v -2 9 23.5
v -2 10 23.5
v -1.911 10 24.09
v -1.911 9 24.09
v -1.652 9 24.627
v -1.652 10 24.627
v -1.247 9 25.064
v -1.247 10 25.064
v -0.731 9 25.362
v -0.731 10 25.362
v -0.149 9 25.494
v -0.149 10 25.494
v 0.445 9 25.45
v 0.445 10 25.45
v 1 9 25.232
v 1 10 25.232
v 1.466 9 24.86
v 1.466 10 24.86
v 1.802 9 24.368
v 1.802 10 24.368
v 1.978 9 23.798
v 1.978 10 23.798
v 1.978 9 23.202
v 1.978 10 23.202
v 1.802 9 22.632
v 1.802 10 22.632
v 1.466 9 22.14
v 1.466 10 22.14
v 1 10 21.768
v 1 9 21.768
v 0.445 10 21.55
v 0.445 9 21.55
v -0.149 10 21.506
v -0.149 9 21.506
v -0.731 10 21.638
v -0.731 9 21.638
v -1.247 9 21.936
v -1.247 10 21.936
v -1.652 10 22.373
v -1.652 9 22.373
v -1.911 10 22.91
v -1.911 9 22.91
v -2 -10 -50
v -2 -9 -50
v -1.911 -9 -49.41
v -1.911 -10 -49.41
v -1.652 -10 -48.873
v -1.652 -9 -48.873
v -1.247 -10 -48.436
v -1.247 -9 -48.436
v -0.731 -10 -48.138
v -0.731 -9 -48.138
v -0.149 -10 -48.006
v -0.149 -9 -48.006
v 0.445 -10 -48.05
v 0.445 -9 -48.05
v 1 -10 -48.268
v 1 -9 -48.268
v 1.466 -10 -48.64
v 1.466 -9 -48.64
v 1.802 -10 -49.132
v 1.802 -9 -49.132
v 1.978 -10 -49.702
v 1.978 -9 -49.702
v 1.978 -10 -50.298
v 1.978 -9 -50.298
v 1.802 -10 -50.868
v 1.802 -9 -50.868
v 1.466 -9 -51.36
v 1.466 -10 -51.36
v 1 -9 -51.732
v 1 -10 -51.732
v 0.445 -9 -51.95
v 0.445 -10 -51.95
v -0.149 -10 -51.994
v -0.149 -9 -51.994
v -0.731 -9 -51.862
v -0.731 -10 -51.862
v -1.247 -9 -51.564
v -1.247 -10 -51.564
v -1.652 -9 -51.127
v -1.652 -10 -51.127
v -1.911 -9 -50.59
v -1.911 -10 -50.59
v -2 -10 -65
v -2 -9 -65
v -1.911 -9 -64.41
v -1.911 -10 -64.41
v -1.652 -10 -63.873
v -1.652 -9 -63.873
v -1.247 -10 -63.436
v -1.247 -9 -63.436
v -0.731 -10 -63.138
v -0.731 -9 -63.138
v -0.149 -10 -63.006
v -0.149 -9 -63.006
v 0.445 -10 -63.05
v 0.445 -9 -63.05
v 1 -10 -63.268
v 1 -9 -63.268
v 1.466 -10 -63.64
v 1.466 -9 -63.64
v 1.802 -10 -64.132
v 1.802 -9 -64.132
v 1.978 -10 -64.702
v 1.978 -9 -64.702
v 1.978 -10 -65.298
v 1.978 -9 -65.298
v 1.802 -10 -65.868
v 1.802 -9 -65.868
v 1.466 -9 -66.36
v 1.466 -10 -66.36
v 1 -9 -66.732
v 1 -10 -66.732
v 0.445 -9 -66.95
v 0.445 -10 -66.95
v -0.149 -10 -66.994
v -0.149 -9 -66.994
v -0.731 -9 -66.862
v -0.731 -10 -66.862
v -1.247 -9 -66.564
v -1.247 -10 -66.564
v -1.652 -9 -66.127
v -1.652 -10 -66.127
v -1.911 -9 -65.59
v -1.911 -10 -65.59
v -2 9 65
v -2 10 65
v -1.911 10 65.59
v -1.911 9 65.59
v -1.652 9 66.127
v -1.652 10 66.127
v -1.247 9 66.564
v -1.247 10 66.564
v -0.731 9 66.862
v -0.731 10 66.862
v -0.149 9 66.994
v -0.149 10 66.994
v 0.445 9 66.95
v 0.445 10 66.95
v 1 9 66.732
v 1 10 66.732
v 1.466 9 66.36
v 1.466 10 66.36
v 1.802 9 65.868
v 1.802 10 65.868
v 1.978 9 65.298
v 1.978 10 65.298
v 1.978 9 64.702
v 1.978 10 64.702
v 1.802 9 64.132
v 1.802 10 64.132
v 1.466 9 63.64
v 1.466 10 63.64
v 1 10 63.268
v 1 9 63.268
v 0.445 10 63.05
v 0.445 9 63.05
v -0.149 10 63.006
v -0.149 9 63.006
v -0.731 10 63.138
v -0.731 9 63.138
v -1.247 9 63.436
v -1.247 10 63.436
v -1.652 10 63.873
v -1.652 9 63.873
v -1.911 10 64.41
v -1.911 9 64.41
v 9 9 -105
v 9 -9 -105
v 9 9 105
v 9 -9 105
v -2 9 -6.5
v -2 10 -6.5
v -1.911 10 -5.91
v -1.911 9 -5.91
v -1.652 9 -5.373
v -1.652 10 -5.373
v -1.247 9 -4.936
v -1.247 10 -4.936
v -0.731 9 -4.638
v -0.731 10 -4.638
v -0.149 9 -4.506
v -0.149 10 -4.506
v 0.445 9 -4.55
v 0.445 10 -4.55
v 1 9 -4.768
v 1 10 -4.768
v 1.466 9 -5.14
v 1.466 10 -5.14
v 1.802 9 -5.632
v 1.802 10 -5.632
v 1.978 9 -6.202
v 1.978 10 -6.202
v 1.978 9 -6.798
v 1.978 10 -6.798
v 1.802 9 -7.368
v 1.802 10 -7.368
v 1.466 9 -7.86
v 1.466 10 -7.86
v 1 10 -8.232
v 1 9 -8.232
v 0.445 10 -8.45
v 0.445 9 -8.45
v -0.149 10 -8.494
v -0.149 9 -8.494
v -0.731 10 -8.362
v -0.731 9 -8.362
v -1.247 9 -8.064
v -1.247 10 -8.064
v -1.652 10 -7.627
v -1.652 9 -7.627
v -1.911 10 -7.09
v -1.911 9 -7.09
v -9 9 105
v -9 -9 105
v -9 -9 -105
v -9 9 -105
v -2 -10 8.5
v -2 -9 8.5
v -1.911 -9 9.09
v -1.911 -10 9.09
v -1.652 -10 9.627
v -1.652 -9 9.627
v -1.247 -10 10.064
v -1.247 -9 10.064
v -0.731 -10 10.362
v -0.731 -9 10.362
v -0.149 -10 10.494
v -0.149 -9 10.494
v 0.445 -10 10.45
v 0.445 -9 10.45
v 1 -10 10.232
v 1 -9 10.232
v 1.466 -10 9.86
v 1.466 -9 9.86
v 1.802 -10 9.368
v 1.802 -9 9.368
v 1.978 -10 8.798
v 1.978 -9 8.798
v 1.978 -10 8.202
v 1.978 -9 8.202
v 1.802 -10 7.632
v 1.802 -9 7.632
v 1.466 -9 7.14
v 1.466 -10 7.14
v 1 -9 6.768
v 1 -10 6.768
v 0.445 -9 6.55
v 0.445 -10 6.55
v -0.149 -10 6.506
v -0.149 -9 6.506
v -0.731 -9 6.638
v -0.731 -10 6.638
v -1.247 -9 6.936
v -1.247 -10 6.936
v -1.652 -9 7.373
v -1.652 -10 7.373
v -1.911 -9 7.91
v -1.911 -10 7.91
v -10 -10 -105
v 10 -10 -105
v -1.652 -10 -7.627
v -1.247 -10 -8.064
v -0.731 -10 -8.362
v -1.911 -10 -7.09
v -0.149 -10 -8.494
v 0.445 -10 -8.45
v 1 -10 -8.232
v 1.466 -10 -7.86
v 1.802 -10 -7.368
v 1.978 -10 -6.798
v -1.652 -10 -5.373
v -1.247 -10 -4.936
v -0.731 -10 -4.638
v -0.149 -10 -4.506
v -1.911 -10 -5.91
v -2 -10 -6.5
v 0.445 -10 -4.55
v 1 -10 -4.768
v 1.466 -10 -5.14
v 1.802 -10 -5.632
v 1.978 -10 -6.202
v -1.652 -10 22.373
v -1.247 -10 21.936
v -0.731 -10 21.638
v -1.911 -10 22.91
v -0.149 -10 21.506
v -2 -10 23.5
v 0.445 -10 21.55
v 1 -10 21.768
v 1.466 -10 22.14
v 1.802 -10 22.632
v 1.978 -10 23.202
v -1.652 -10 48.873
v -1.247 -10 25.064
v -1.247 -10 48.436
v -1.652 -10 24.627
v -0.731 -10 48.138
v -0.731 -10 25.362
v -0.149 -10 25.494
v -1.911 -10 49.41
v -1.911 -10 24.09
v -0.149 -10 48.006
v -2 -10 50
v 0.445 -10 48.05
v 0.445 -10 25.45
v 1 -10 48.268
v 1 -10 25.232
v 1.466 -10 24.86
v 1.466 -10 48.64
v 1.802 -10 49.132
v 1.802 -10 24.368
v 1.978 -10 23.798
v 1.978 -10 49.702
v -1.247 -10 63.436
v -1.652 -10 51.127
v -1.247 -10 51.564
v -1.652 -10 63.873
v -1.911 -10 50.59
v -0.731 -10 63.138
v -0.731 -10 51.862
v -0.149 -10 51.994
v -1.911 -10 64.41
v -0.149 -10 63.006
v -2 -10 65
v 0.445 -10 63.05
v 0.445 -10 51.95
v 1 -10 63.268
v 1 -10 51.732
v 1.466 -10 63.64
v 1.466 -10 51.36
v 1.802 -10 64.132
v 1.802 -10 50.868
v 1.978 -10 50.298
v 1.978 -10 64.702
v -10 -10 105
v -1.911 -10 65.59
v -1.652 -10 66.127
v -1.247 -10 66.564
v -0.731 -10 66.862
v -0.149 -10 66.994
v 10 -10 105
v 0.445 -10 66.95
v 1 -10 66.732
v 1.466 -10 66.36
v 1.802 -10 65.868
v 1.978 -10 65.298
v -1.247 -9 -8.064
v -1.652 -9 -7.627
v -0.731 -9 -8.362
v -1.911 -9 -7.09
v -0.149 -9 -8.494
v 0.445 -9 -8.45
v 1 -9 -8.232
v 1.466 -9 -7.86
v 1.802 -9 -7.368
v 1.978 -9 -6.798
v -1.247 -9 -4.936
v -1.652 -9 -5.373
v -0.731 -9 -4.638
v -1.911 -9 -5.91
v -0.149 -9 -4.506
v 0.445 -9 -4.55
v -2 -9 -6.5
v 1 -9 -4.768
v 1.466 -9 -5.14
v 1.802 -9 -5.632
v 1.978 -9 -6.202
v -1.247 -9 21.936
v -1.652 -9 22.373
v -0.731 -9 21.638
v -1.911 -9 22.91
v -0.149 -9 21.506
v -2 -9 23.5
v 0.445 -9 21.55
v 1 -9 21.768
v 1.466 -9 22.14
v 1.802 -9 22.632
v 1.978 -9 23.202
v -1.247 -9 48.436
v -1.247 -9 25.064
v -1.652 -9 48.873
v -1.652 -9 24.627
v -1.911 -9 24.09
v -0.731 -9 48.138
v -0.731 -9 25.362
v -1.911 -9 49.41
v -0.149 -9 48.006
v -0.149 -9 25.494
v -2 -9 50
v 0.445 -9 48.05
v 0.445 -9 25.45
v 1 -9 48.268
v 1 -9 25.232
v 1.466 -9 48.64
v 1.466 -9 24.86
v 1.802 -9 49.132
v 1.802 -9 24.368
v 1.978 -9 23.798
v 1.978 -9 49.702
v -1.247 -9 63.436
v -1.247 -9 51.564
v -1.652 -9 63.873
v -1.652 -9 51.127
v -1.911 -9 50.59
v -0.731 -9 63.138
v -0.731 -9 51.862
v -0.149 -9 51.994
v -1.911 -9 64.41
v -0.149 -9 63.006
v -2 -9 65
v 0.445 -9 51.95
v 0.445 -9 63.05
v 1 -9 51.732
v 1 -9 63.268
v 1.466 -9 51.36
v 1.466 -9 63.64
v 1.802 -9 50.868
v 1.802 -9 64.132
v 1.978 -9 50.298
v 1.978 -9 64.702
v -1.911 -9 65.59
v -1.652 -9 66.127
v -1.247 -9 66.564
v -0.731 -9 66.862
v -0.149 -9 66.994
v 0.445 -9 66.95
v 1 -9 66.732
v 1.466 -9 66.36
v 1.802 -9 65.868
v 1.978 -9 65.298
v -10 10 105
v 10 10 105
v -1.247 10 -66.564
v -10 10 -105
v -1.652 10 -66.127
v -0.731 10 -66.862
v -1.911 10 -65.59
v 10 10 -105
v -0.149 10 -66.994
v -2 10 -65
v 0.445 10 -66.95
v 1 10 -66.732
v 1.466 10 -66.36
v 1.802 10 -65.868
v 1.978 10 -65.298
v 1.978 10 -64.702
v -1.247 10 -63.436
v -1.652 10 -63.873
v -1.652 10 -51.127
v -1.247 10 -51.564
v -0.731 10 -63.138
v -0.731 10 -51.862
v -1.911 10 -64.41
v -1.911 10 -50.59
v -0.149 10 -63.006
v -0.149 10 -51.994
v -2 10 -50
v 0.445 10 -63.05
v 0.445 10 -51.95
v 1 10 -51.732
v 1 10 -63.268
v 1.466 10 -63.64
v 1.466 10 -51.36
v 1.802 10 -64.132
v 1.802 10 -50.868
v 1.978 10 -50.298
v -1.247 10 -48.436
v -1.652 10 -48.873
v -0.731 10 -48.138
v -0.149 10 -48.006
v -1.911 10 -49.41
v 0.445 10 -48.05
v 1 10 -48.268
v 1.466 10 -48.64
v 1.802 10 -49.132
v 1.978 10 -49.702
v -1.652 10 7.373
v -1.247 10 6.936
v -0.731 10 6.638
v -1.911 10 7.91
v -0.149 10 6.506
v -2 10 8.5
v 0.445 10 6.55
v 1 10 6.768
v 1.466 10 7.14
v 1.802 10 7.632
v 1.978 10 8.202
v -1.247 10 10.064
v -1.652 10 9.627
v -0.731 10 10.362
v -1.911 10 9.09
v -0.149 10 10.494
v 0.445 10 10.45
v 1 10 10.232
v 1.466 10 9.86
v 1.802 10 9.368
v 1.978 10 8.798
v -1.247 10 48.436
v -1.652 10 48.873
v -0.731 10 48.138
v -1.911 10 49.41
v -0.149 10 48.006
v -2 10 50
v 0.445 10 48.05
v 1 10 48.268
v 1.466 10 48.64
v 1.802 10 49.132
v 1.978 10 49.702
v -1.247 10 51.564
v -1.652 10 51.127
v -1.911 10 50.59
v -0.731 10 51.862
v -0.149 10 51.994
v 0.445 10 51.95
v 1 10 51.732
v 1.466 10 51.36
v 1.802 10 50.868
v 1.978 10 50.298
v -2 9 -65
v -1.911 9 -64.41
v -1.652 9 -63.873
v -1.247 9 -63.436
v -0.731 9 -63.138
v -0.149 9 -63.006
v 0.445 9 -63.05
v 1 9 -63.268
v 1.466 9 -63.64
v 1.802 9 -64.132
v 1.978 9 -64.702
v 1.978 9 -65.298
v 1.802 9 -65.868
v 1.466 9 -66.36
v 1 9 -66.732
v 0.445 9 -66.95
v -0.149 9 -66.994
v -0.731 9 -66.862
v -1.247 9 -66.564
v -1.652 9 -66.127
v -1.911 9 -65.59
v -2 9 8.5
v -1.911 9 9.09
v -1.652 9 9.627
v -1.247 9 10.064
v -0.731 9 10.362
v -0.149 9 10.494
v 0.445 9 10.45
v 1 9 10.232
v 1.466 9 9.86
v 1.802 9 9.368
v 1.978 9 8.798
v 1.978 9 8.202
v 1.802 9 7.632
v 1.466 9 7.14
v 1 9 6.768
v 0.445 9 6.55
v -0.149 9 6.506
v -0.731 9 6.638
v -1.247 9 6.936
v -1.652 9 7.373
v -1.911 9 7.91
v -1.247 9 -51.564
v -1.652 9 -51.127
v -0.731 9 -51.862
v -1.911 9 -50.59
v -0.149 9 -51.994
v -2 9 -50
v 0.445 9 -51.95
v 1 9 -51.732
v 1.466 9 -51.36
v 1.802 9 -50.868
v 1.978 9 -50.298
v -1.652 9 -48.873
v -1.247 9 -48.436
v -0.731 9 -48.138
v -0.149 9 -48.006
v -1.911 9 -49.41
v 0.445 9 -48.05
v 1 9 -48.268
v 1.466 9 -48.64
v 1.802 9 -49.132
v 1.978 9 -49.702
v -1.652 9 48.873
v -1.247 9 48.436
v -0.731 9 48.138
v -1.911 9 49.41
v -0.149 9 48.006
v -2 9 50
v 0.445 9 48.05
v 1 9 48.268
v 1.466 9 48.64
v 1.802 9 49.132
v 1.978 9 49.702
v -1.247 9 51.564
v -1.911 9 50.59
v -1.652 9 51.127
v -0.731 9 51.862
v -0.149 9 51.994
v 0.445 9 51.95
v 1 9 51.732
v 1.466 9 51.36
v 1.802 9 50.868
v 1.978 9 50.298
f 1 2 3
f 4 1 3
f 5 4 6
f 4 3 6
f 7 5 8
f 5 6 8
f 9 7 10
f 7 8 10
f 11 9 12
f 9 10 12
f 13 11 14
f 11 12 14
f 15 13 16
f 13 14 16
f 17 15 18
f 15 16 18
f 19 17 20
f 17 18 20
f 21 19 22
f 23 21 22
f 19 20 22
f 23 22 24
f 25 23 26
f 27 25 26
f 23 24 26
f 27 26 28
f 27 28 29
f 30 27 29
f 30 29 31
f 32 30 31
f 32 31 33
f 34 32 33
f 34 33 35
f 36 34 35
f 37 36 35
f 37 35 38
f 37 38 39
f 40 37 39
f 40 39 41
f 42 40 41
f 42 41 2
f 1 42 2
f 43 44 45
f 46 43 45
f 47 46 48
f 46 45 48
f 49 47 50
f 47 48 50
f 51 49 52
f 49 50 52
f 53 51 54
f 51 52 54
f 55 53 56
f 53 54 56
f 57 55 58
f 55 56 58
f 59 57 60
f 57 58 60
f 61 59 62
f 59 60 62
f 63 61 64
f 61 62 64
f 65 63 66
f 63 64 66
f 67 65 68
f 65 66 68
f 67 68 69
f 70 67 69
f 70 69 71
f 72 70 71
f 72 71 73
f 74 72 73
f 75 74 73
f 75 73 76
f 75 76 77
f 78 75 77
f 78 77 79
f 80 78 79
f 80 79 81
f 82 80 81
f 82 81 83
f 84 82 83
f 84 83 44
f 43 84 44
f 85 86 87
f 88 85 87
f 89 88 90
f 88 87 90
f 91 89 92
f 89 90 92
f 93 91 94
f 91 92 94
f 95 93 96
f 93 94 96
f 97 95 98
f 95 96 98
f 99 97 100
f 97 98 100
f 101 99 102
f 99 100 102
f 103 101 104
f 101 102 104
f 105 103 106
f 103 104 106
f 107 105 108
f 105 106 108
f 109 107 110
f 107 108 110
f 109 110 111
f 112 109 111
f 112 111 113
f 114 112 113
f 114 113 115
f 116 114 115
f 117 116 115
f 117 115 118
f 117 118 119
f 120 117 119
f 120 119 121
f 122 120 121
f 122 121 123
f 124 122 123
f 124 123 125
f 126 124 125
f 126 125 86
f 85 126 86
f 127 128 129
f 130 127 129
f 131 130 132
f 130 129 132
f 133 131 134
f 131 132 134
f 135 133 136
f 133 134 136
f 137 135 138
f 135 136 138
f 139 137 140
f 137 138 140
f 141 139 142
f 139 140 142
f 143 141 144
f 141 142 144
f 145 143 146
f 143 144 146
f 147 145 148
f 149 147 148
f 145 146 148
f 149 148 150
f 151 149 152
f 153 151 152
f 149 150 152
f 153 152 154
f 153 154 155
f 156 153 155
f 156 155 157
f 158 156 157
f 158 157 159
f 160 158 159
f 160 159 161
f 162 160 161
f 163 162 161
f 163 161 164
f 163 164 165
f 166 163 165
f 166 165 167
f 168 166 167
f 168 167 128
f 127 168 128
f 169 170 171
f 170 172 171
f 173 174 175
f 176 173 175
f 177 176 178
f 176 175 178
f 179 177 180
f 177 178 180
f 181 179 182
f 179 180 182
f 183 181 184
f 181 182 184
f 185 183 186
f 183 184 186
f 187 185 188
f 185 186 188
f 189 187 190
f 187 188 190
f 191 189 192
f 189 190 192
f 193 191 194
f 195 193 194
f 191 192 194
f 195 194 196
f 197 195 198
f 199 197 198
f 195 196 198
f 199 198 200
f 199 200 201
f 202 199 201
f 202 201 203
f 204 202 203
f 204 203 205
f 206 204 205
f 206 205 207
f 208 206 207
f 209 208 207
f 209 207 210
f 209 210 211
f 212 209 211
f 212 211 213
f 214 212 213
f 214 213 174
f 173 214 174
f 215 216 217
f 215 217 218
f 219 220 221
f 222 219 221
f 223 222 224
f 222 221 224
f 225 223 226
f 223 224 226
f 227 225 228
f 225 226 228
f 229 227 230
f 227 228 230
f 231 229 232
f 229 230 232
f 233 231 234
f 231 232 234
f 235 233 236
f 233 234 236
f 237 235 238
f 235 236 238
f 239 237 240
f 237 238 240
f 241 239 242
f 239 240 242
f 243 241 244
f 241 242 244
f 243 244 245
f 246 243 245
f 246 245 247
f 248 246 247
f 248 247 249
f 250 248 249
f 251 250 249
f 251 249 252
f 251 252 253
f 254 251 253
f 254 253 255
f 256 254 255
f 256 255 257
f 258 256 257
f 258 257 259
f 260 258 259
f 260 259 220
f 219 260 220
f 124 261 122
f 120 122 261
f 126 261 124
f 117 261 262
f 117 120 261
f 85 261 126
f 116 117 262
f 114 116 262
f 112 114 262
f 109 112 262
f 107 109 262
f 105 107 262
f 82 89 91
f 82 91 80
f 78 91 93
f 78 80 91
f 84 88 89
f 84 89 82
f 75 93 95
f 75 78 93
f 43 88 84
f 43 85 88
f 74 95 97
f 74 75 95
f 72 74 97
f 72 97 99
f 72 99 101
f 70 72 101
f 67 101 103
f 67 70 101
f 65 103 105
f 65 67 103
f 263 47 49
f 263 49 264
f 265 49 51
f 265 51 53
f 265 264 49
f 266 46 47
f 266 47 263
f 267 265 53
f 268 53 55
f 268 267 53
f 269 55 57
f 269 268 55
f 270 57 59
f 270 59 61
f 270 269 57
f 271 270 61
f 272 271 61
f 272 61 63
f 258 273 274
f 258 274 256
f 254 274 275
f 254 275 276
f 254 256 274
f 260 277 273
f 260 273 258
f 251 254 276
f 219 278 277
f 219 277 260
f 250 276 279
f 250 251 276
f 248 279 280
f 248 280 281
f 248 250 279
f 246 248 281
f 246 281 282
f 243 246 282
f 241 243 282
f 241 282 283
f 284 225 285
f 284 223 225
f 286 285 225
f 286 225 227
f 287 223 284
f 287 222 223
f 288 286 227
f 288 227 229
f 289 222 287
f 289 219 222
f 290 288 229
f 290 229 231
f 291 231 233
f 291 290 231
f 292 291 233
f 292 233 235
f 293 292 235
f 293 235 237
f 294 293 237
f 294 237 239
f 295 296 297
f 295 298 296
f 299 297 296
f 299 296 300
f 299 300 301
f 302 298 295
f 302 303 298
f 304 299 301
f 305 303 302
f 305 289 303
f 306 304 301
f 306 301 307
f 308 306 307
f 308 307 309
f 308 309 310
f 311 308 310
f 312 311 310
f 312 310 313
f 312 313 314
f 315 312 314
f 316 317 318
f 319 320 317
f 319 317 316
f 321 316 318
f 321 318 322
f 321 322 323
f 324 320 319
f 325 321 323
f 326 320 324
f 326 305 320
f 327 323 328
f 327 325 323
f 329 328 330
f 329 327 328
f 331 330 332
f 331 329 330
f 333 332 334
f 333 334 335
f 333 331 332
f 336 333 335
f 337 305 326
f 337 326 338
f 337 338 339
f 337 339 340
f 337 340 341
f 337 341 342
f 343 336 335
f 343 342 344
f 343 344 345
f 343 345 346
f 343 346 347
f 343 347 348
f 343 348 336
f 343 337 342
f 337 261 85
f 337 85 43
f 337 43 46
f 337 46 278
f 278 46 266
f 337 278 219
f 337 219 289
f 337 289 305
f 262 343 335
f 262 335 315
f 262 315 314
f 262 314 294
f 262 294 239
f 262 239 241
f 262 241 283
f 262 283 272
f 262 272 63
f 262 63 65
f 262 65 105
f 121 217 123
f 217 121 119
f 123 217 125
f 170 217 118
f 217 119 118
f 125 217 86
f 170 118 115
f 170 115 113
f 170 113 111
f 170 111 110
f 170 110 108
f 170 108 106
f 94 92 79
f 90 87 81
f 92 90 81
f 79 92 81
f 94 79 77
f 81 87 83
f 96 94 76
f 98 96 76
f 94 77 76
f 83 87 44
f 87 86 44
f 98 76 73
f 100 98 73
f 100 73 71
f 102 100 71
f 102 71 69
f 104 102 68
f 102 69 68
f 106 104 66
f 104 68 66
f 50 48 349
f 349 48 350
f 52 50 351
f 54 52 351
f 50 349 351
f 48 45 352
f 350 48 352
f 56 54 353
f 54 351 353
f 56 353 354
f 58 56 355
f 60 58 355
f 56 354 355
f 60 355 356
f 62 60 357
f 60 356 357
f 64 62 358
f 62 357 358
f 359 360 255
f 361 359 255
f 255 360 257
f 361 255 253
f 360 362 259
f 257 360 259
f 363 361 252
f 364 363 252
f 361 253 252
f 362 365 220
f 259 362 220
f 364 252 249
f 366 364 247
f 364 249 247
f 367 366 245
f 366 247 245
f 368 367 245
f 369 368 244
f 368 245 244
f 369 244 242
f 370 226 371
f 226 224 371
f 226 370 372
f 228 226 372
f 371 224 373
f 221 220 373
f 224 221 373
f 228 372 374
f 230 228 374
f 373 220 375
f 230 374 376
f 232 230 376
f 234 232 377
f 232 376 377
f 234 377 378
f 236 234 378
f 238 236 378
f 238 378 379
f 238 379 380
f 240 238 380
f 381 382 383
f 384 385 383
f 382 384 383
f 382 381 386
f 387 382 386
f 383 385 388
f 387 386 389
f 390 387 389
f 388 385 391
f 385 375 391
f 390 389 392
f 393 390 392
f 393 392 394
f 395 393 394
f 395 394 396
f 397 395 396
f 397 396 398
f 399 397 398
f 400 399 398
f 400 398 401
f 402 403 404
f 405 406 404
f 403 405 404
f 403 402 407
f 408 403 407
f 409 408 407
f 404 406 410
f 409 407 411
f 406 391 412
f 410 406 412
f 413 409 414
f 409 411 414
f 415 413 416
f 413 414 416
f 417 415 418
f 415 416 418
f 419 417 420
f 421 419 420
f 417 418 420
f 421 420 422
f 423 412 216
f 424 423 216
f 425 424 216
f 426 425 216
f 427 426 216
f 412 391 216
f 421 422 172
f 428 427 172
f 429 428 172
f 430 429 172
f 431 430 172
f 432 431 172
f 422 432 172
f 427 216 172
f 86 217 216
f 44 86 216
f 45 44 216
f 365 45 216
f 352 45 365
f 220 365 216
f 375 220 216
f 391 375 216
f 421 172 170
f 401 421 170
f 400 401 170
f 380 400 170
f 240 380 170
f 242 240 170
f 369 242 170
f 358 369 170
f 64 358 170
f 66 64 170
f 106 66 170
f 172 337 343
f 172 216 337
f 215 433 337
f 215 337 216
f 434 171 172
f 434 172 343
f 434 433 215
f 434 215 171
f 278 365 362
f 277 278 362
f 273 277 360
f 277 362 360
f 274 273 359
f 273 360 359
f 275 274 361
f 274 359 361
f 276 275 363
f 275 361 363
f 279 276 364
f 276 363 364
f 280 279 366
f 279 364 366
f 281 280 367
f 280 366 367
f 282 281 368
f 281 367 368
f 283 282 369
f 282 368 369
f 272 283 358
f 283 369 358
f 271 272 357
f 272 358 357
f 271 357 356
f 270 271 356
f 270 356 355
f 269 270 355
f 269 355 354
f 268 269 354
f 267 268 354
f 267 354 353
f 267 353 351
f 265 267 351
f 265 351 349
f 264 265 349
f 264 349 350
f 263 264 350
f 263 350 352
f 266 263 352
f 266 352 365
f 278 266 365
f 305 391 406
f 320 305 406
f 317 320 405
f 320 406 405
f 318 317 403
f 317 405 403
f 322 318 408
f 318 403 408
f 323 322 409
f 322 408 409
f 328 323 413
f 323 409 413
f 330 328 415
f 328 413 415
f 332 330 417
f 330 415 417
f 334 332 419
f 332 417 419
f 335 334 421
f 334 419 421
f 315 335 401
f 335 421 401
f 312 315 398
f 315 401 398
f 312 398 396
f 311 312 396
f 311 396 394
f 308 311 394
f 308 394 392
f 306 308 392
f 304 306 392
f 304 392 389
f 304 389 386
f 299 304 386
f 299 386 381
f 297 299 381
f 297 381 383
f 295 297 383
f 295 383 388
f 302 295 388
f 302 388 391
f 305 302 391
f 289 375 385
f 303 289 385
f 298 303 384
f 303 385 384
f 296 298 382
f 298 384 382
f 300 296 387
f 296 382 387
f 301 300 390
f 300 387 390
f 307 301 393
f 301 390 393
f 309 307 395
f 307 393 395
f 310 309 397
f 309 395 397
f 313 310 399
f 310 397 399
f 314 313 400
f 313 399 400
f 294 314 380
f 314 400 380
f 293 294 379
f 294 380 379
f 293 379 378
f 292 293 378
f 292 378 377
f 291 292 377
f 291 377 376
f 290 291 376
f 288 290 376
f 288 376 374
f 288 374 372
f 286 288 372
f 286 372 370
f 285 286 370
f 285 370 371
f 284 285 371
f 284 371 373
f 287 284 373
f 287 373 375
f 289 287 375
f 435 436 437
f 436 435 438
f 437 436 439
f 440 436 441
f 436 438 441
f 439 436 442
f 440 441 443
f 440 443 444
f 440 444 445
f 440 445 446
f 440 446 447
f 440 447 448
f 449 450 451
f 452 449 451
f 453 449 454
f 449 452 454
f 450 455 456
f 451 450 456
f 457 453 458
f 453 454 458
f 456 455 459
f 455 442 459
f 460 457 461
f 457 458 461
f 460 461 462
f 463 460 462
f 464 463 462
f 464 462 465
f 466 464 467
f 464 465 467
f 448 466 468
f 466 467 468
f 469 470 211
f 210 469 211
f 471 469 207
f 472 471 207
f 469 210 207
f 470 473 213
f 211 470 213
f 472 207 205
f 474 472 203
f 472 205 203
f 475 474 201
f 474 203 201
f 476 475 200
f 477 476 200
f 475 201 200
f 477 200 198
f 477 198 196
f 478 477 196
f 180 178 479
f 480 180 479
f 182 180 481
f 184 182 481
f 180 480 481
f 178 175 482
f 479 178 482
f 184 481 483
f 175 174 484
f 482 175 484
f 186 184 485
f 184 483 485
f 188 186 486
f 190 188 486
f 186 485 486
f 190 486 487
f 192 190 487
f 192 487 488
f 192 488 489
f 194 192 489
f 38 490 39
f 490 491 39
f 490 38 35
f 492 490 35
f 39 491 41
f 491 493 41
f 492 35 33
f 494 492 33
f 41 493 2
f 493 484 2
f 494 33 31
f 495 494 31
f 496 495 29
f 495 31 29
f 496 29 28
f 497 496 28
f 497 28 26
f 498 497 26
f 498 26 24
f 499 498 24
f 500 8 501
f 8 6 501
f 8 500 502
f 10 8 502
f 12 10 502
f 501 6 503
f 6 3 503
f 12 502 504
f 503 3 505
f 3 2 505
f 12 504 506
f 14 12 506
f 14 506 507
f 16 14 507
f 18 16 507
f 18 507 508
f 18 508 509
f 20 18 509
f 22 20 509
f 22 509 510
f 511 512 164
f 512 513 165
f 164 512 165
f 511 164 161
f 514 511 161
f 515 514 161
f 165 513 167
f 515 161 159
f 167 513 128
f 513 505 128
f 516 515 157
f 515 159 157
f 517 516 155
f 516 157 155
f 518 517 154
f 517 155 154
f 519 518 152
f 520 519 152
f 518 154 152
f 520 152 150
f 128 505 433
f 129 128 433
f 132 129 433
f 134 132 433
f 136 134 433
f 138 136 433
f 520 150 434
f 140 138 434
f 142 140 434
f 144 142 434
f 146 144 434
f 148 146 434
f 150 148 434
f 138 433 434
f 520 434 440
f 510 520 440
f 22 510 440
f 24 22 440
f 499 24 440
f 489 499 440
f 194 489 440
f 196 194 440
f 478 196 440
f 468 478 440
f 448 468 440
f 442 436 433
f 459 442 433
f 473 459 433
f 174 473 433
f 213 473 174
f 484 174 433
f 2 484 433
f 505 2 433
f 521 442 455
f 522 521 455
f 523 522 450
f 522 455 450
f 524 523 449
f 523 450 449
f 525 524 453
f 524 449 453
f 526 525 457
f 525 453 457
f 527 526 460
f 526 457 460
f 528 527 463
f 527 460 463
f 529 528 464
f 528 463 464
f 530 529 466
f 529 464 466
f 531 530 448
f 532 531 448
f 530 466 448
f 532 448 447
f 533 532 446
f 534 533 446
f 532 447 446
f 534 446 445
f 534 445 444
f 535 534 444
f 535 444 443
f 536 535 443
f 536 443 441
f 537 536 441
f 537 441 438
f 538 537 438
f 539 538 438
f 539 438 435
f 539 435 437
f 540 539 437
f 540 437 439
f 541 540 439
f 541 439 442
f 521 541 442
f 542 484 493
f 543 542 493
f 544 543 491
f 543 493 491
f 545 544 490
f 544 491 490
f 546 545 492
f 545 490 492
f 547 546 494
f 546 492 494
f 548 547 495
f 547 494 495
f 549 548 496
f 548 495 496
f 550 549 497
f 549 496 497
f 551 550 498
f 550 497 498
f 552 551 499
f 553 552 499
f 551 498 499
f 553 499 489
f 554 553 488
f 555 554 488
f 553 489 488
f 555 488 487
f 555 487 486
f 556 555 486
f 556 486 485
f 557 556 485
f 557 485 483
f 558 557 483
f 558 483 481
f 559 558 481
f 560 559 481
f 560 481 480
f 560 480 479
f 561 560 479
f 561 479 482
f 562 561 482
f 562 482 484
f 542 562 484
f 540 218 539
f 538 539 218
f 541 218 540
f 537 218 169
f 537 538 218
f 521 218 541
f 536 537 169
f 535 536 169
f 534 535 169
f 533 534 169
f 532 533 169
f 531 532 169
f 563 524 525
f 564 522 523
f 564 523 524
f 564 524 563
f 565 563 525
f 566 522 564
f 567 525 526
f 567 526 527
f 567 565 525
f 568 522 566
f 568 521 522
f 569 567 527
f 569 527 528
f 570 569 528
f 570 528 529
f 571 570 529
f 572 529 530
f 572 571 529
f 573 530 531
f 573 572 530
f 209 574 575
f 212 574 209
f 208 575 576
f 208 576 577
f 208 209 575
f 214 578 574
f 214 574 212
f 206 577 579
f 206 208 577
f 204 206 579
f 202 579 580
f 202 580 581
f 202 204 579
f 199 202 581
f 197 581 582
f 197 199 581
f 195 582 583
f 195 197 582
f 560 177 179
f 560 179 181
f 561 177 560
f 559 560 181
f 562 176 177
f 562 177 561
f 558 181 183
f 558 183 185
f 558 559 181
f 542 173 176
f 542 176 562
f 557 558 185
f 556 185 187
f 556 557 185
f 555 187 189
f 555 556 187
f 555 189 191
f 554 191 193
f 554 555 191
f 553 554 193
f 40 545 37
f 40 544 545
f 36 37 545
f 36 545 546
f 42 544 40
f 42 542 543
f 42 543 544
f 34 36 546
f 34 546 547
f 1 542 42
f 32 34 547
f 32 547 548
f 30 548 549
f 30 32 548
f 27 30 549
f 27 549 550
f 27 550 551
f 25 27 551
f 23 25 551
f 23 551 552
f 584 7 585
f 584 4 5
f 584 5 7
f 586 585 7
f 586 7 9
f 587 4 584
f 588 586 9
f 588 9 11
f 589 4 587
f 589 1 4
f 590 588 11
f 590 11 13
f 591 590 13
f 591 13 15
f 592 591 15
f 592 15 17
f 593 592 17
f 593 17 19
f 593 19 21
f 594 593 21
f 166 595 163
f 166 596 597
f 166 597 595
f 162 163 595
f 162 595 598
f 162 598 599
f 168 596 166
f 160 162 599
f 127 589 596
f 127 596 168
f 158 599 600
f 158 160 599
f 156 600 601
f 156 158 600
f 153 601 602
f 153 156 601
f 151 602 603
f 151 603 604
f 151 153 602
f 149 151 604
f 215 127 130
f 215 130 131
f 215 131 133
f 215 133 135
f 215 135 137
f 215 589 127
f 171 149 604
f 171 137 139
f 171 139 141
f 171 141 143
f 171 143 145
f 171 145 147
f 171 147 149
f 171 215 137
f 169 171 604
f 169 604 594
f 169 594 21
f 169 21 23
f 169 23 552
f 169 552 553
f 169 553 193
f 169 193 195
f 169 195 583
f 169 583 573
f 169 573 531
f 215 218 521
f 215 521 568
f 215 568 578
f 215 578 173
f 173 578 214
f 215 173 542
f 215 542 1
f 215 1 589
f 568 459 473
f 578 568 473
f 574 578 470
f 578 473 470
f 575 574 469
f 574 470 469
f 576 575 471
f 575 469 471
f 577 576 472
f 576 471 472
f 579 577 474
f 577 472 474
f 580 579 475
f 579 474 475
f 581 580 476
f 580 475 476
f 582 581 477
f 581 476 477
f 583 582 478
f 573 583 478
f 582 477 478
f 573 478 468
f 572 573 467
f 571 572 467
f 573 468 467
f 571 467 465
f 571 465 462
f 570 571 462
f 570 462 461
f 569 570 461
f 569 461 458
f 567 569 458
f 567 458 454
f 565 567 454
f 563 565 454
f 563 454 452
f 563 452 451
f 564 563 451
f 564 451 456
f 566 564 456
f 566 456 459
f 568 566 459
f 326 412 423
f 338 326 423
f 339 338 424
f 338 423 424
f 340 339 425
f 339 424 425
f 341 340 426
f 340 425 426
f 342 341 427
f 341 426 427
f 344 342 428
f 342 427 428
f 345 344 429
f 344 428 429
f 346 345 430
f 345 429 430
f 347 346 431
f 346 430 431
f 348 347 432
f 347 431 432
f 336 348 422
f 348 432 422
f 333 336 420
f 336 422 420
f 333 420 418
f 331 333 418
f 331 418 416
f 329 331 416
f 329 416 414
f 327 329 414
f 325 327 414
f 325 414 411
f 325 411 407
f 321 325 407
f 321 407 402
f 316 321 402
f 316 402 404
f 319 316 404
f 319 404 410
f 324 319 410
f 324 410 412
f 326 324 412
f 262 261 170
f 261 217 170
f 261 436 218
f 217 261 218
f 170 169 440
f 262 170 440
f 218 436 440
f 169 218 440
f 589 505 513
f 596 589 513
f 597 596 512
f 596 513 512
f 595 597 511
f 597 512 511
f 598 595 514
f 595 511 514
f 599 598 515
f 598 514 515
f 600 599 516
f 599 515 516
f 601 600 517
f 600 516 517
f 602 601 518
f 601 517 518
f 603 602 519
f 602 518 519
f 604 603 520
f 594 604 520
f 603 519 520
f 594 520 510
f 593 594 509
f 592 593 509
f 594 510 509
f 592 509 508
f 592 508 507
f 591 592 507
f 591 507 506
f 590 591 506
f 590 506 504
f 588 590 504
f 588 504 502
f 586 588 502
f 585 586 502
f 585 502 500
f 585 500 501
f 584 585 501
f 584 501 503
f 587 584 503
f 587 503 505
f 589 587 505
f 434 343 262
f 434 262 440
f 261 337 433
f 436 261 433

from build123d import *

# Parameters (mm, degrees)
SKETCH_1_W          = 20
SKETCH_1_H          = 20
SKETCH_1_W_2        = 18
SKETCH_1_H_2        = 18
EXTRUDE_1_DEPTH     = 105
SKETCH_2_R          = 2
CUT_EXTRUDE_1_DEPTH = 108.354552768
SKETCH_3_R          = 2
CUT_EXTRUDE_2_DEPTH = 108.354552768


with BuildPart() as part:
    # 草图1 → 凸台-拉伸1 (new, symmetric)
    with BuildSketch(Plane.XY):
        Rectangle(SKETCH_1_W, SKETCH_1_H)
        Rectangle(SKETCH_1_W_2, SKETCH_1_H_2, mode=Mode.SUBTRACT)
    extrude(amount=EXTRUDE_1_DEPTH, both=True)

    # 草图2 → 切除-拉伸1 (cut, through all)
    with BuildSketch(Plane(origin=(0, 10, 0), x_dir=(1, 0, 0), z_dir=(0, 1, 0))):
        with Locations(Location((0, 65, 0), (0, 0, 180))):
            Circle(SKETCH_2_R)
        with Locations(Location((0, -65, 0), (0, 0, 180))):
            Circle(SKETCH_2_R)
        with Locations(Location((0, -50, 0), (0, 0, 180))):
            Circle(SKETCH_2_R)
        with Locations(Location((0, 50, 0), (0, 0, 180))):
            Circle(SKETCH_2_R)
    extrude(amount=-CUT_EXTRUDE_1_DEPTH, mode=Mode.SUBTRACT)

    # 草图3 → 切除-拉伸2 (cut, through all)
    with BuildSketch(Plane(origin=(0, 10, 0), x_dir=(1, 0, 0), z_dir=(0, 1, 0))):
        with Locations(Location((0, -8.5, 0), (0, 0, 180))):
            Circle(SKETCH_3_R)
        with Locations(Location((0, 6.5, 0), (0, 0, 180))):
            Circle(SKETCH_3_R)
        with Locations(Location((0, -23.5, 0), (0, 0, 180))):
            Circle(SKETCH_3_R)
    extrude(amount=-CUT_EXTRUDE_2_DEPTH, mode=Mode.SUBTRACT)


solid = part.part
